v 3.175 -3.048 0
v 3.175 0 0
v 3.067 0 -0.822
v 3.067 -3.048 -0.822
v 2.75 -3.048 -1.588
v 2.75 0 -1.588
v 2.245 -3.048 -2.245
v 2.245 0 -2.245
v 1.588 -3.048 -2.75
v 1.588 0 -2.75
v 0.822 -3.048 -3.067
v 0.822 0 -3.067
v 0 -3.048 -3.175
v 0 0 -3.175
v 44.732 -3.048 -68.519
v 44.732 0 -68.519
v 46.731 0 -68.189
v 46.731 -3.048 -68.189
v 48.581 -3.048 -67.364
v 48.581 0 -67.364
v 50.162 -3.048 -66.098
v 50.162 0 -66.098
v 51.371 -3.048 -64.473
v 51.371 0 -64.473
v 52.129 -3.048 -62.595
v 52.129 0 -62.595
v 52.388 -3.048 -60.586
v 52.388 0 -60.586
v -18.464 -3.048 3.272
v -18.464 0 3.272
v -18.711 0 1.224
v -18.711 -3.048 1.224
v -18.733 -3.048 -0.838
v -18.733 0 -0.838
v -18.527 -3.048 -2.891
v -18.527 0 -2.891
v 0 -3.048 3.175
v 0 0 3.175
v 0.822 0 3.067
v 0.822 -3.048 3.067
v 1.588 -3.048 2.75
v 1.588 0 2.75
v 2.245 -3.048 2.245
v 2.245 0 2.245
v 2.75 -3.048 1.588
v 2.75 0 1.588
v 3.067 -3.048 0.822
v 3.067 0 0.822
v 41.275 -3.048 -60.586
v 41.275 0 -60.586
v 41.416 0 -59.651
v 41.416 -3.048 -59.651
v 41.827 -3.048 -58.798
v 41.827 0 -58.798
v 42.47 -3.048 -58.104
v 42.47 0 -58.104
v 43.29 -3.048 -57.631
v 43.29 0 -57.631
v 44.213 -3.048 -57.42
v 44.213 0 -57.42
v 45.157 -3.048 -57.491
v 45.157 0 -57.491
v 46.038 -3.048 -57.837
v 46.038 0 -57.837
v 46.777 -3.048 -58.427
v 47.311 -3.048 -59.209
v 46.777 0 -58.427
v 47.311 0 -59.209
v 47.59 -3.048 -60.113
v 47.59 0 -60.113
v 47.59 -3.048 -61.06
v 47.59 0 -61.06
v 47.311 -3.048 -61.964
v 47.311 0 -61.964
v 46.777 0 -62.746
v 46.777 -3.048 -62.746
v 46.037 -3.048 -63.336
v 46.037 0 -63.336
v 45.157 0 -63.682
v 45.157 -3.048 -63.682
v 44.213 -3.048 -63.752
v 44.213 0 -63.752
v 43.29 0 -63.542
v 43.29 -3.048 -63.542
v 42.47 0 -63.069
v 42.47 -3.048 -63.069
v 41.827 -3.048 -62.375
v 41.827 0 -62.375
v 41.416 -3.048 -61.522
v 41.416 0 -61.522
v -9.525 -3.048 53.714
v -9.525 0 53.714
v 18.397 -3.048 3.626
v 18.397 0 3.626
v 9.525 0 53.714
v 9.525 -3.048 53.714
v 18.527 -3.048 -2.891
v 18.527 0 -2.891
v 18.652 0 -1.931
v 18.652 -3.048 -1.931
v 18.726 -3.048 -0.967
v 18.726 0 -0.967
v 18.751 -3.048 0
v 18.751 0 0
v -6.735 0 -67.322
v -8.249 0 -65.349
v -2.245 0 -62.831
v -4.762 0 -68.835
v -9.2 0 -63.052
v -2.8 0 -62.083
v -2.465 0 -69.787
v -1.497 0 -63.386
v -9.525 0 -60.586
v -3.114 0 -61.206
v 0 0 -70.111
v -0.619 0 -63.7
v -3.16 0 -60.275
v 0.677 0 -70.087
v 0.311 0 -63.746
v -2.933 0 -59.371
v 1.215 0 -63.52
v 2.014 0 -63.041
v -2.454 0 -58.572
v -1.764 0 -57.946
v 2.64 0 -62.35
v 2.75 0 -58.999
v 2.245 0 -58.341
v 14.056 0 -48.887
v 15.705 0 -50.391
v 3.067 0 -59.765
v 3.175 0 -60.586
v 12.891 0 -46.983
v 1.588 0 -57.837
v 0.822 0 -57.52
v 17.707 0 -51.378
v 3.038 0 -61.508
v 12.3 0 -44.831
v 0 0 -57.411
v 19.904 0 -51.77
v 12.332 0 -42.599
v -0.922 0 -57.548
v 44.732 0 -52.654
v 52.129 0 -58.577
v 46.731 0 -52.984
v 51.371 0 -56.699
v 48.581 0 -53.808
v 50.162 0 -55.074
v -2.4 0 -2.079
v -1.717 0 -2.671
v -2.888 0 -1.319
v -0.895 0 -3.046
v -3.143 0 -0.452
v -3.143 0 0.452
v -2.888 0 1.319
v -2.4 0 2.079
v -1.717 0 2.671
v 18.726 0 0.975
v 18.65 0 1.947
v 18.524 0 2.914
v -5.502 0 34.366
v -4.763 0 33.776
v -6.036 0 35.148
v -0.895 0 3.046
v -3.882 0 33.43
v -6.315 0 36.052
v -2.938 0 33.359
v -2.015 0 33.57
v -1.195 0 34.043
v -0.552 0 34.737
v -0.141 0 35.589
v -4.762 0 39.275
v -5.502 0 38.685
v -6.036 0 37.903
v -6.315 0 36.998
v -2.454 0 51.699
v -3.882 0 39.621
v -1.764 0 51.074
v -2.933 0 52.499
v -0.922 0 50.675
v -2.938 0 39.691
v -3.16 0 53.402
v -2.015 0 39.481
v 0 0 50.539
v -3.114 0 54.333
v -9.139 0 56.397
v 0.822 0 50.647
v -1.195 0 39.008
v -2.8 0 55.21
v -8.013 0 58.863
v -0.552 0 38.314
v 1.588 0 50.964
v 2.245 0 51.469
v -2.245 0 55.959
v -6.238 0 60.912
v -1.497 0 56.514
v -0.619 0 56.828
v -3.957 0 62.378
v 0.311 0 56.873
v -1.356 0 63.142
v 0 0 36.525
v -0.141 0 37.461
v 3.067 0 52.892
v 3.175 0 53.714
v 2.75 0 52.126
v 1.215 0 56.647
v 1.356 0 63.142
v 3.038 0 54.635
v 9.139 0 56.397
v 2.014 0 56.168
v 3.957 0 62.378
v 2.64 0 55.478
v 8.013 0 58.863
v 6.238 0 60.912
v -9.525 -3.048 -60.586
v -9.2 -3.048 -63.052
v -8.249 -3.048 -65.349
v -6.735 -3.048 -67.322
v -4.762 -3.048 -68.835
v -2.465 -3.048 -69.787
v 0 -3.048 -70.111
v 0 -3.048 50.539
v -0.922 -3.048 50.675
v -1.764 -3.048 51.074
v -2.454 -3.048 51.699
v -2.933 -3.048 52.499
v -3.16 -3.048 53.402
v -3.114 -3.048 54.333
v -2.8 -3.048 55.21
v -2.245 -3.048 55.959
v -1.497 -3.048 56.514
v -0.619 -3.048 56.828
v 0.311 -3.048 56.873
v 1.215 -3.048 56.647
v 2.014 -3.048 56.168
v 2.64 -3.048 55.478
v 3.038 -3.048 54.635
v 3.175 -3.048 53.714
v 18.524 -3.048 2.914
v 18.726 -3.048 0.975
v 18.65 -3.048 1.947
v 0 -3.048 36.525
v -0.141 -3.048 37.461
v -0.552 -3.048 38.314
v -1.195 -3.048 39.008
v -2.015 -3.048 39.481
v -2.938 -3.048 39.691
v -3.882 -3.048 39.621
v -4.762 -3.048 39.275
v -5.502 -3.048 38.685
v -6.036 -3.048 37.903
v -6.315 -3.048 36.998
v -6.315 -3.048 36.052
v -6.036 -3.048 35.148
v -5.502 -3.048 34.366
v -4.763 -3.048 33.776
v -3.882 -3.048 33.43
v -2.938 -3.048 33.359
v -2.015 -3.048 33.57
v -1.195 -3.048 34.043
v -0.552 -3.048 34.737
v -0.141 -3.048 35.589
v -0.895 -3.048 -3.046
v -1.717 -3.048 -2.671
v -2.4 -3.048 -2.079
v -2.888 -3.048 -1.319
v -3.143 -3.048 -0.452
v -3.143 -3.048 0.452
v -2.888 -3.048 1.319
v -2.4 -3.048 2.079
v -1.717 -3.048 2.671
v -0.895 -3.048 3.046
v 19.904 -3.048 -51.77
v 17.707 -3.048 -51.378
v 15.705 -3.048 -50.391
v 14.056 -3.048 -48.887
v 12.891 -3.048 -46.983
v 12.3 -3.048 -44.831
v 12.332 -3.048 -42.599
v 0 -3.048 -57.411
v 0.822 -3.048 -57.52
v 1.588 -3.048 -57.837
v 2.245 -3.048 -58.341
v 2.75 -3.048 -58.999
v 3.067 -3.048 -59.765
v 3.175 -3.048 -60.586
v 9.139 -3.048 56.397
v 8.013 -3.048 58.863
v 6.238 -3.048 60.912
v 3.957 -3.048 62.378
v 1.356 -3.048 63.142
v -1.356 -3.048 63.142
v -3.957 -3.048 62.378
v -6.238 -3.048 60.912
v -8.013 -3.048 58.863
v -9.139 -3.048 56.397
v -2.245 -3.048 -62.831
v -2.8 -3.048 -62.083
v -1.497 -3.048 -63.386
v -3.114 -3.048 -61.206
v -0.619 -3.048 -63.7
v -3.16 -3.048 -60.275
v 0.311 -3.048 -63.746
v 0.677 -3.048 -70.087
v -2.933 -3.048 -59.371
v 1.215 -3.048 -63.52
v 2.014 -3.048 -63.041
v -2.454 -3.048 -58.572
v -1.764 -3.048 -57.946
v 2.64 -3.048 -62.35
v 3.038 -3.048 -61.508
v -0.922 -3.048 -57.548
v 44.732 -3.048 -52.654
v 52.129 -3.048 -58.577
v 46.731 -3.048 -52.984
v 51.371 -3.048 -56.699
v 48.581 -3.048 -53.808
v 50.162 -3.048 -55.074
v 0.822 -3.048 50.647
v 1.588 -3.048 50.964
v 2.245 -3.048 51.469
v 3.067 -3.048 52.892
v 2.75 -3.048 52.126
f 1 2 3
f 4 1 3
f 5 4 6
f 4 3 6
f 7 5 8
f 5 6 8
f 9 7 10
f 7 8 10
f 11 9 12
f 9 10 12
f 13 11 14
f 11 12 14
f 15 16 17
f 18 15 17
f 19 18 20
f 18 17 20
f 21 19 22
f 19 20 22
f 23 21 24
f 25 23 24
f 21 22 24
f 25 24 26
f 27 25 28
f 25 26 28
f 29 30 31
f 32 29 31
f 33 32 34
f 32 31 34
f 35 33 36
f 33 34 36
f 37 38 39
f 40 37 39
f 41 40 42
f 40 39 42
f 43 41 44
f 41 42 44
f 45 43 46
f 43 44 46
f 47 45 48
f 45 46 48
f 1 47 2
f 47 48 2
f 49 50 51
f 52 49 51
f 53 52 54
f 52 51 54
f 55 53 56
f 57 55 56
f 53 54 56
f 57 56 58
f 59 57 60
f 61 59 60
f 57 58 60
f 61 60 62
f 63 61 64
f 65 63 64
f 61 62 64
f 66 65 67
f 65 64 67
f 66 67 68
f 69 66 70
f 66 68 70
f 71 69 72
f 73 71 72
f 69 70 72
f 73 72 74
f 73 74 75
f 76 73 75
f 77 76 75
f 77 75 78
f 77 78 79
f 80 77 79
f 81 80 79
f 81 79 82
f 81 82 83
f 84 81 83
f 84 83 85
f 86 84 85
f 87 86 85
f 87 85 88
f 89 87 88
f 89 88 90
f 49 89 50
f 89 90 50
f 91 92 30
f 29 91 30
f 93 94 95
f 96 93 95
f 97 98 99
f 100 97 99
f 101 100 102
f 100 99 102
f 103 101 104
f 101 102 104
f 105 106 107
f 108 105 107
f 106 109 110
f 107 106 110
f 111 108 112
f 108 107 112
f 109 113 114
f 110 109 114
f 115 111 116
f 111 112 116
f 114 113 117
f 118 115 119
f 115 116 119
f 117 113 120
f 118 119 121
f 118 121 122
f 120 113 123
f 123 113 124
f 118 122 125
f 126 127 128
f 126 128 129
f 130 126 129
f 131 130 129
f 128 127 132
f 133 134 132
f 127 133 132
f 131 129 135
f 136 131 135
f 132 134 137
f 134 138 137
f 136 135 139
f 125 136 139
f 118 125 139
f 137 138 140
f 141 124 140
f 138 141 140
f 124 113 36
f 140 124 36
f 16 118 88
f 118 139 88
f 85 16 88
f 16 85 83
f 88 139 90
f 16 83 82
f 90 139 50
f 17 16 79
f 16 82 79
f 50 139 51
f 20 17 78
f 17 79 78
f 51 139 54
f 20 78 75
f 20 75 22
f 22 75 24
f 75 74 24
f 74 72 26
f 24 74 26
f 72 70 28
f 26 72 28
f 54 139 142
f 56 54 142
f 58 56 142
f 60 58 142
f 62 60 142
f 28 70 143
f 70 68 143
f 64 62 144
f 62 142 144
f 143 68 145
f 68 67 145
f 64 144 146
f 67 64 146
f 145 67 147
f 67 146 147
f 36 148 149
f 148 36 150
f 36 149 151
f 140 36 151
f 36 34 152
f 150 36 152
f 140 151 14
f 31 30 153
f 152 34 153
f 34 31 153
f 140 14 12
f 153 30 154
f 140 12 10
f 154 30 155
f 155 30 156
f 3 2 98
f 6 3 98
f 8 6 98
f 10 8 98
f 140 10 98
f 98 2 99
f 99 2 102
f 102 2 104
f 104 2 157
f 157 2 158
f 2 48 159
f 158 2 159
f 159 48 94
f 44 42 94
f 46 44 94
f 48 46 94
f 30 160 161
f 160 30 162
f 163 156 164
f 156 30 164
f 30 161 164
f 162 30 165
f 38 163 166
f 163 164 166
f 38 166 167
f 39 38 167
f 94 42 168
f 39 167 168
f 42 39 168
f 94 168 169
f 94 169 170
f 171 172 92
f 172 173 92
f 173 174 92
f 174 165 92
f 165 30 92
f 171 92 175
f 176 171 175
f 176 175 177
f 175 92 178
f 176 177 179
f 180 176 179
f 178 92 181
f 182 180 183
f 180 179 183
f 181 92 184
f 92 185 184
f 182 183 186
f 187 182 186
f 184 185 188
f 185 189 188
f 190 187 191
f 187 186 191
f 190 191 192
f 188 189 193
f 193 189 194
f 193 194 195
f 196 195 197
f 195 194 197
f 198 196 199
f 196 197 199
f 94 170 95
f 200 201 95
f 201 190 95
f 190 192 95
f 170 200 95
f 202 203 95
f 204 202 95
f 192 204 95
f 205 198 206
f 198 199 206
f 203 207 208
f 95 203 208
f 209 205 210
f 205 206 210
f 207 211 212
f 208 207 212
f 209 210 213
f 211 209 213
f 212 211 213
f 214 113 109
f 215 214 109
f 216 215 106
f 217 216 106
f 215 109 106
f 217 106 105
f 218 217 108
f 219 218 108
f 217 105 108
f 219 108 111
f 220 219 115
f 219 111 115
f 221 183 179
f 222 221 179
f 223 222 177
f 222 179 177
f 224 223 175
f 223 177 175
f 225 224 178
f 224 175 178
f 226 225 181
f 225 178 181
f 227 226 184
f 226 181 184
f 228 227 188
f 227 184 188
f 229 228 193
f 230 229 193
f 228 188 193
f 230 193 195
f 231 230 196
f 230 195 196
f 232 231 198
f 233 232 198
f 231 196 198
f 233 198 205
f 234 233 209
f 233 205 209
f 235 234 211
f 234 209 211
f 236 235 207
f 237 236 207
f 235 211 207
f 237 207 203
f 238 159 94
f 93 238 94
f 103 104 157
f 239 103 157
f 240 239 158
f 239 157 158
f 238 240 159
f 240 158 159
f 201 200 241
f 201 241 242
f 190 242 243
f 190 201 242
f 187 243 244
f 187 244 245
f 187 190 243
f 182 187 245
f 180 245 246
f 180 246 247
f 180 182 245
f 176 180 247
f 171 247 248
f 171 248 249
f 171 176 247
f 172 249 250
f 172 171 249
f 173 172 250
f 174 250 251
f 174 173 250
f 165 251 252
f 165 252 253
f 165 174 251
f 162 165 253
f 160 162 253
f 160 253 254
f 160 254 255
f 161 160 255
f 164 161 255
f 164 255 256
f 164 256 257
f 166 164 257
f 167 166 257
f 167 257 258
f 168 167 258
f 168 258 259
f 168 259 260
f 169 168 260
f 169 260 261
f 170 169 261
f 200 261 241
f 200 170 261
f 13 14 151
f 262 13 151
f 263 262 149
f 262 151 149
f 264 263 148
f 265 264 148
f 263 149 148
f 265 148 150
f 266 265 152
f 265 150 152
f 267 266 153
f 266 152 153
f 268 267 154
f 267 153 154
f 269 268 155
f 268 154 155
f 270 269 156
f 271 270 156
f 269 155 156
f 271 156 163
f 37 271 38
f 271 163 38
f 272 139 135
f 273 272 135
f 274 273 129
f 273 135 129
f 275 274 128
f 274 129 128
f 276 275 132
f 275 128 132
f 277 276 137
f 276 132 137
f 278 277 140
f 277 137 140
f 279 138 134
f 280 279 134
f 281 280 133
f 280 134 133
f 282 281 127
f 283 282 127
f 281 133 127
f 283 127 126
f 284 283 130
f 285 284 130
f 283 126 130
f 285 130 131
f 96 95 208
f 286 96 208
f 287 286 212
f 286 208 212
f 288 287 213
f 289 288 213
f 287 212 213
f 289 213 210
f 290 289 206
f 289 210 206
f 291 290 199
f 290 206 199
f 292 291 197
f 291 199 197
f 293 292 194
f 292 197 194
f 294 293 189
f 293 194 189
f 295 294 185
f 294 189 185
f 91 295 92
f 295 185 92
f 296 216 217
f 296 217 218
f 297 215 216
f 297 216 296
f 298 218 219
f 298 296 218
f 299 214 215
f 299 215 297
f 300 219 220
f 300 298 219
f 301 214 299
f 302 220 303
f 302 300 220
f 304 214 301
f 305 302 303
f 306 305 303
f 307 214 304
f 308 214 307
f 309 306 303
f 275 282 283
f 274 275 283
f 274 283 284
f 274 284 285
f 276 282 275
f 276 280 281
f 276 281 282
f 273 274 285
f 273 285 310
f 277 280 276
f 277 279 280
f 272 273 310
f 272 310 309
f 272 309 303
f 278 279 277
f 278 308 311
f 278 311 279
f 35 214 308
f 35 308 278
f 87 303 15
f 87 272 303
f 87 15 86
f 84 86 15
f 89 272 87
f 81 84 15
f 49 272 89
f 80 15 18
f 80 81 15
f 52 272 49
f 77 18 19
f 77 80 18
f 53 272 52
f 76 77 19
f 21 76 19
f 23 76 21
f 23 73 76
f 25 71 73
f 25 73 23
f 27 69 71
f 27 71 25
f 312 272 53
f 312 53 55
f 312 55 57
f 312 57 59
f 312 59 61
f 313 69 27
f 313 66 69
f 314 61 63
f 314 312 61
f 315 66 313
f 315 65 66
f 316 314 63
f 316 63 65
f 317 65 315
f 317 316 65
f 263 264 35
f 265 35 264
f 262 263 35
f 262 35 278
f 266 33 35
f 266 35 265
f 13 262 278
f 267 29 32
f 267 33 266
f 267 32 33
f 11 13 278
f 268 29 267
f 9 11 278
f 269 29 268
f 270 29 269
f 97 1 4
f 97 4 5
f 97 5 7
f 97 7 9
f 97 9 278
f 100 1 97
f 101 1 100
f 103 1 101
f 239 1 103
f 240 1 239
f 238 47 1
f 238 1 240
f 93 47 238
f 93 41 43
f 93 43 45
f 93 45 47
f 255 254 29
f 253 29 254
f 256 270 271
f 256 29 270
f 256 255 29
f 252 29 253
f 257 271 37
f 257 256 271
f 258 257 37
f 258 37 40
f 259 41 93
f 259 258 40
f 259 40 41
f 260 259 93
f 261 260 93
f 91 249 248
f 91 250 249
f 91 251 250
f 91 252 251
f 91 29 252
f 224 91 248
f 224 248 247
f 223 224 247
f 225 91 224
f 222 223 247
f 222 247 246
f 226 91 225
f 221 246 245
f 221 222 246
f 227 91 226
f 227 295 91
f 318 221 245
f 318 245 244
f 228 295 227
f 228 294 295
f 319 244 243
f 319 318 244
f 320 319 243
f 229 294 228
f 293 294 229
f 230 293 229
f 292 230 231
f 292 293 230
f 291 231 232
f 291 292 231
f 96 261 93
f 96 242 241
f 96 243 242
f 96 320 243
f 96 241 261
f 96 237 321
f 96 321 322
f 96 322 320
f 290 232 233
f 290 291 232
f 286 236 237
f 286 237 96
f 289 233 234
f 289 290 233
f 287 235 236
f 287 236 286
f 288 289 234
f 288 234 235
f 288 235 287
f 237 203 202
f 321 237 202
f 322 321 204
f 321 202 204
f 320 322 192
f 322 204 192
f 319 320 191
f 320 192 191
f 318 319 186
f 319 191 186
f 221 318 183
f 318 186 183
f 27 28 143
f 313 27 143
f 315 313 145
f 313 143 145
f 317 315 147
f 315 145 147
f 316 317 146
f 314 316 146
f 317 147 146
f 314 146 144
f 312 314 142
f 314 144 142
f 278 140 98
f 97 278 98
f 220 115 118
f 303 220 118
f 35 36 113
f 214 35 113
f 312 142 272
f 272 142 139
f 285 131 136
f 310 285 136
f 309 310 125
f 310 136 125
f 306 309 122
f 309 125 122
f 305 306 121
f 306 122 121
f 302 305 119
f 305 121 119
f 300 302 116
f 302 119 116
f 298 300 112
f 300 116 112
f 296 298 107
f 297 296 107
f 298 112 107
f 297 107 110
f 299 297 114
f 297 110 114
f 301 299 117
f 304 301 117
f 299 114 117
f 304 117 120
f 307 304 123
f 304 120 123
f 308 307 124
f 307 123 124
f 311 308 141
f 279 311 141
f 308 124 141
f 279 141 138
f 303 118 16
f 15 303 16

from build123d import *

# Parameters (mm, degrees)
F0_R     = 3.175
F1_DEPTH = 3.048


with BuildPart() as f1:
    # F0 (on Front) → F1 (new body)
    with BuildSketch(Plane.XZ):
        with BuildLine():
            ThreePointArc((18.5272162363, -2.8907946242), (12.1944256202, -14.2446628188), (0, -18.7513848829))
            Line((0, -18.7513848829), (0, -51.0613519013))
            ThreePointArc((0, -51.0613519013), (6.7351920908, -53.8511598105), (9.525, -60.5863519013))
            Line((9.525, -60.5863519013), (36.5125, -60.5863519013))
            ThreePointArc((36.5125, -60.5863519013), (38.9380895153, -54.8747191174), (44.7324052746, -52.6538772867))
            Line((44.7324052746, -52.6538772867), (19.9038367454, -51.7699515192))
            ThreePointArc((19.9038367454, -51.7699515192), (14.056218392, -48.8866966862), (12.3315367458, -42.5991477155))
            Line((12.3315367458, -42.5991477155), (18.5272162363, -2.8907946242))
        make_face()
        with BuildLine():
            Line((36.5125, -60.5863519013), (9.525, -60.5863519013))
            ThreePointArc((9.525, -60.5863519013), (6.9705567315, -67.0776509895), (0.6773435479, -70.0872376873))
            Line((0.6773435479, -70.0872376873), (44.7324052746, -68.5188265159))
            ThreePointArc((44.7324052746, -68.5188265159), (38.9380895153, -66.2979846852), (36.5125, -60.5863519013))
        make_face()
        with BuildLine():
            Line((0, 18.7513848829), (0, 3.175))
            ThreePointArc((0, 3.175), (2.2450640303, 2.2450640303), (3.175, 0))
            ThreePointArc((3.175, 0), (2.2450640303, -2.2450640303), (0, -3.175))
            Line((0, -3.175), (0, -18.7513848829))
            ThreePointArc((0, -18.7513848829), (12.1944256202, -14.2446628188), (18.5272162363, -2.8907946242))
            ThreePointArc((18.5272162363, -2.8907946242), (18.6952587236, -1.4497366262), (18.7513848829, 0))
            ThreePointArc((18.7513848829, 0), (18.6943609499, 1.4612678406), (18.5236359763, 2.9136480987))
            Line((18.5236359763, 2.9136480987), (18.3973654955, 3.6264828487))
            ThreePointArc((18.3973654955, 3.6264828487), (11.9082504878, 14.4847507865), (0, 18.7513848829))
        make_face()
        with BuildLine():
            ThreePointArc((0, -3.175), (-3.175, 0), (0, 3.175))
            Line((0, 3.175), (0, 18.7513848829))
            ThreePointArc((0, 18.7513848829), (-12.0470149388, 14.3695464817), (-18.4637179825, 3.2719341818))
            ThreePointArc((-18.4637179825, 3.2719341818), (-18.7503896007, 0.1931963966), (-18.5272162363, -2.8907946242))
            ThreePointArc((-18.5272162363, -2.8907946242), (-12.1944256202, -14.2446628188), (0, -18.7513848829))
            Line((0, -18.7513848829), (0, -3.175))
        make_face()
        with BuildLine():
            Line((0, -57.4113519013), (0, -51.0613519013))
            ThreePointArc((0, -51.0613519013), (-6.7351920908, -53.8511598105), (-9.525, -60.5863519013))
            ThreePointArc((-9.525, -60.5863519013), (-6.7351920908, -67.3215439921), (0, -70.1113519013))
            Line((0, -70.1113519013), (0.6773435479, -70.0872376873))
            ThreePointArc((0.6773435479, -70.0872376873), (6.9705567315, -67.0776509895), (9.525, -60.5863519013))
            Line((9.525, -60.5863519013), (3.175, -60.5863519013))
            ThreePointArc((3.175, -60.5863519013), (-2.2450640303, -62.8314159316), (0, -57.4113519013))
        make_face()
        with BuildLine():
            ThreePointArc((9.525, -60.5863519013), (6.7351920908, -53.8511598105), (0, -51.0613519013))
            Line((0, -51.0613519013), (0, -57.4113519013))
            ThreePointArc((0, -57.4113519013), (2.2450640303, -58.341287871), (3.175, -60.5863519013))
            Line((3.175, -60.5863519013), (9.525, -60.5863519013))
        make_face()
        with BuildLine():
            ThreePointArc((-18.4637179825, 3.2719341818), (-12.0470149388, 14.3695464817), (0, 18.7513848829))
            Line((0, 18.7513848829), (0, 36.5252))
            Line((0, 36.5252), (0, 44.1886480987))
            ThreePointArc((0, 44.1886480987), (-6.7351920908, 46.9784560079), (-9.525, 53.7136480987))
            Line((-9.525, 53.7136480987), (-18.4637179825, 3.2719341818))
        make_face()
        with Locations((-3.175, 36.5252)):
            Circle(F0_R, mode=Mode.SUBTRACT)
        with BuildLine():
            Line((0, 36.5252), (0, 18.7513848829))
            ThreePointArc((0, 18.7513848829), (11.9082504878, 14.4847507865), (18.3973654955, 3.6264828487))
            Line((18.3973654955, 3.6264828487), (9.525, 53.7136480987))
            ThreePointArc((9.525, 53.7136480987), (6.7351920908, 46.9784560079), (0, 44.1886480987))
            Line((0, 44.1886480987), (0, 36.5252))
        make_face()
        with BuildLine():
            Line((0, -51.0613519013), (0, -18.7513848829))
            ThreePointArc((0, -18.7513848829), (-12.1944256202, -14.2446628188), (-18.5272162363, -2.8907946242))
            Line((-18.5272162363, -2.8907946242), (-9.525, -60.5863519013))
            ThreePointArc((-9.525, -60.5863519013), (-6.7351920908, -53.8511598105), (0, -51.0613519013))
        make_face()
        with BuildLine():
            ThreePointArc((44.7324052746, -52.6538772867), (38.9380895153, -54.8747191174), (36.5125, -60.5863519013))
            ThreePointArc((36.5125, -60.5863519013), (38.9380895153, -66.2979846852), (44.7324052746, -68.5188265159))
            ThreePointArc((44.7324052746, -68.5188265159), (50.1616327839, -66.098262386), (52.3875, -60.5863519013))
            ThreePointArc((52.3875, -60.5863519013), (50.1616327839, -55.0744414166), (44.7324052746, -52.6538772867))
        make_face()
        with BuildLine():
            ThreePointArc((47.625, -60.5863519013), (44.45, -63.7613519013), (41.275, -60.5863519013))
            ThreePointArc((41.275, -60.5863519013), (44.45, -57.4113519013), (47.625, -60.5863519013))
        make_face(mode=Mode.SUBTRACT)
        with BuildLine():
            ThreePointArc((-9.525, 53.7136480987), (-6.7351920908, 46.9784560079), (0, 44.1886480987))
            ThreePointArc((0, 44.1886480987), (6.7351920908, 46.9784560079), (9.525, 53.7136480987))
            ThreePointArc((9.525, 53.7136480987), (0, 63.2386480987), (-9.525, 53.7136480987))
        make_face()
        with BuildLine():
            ThreePointArc((3.175, 53.7136480987), (2.2450640303, 51.4685840684), (0, 50.5386480987))
            ThreePointArc((0, 50.5386480987), (-2.2450640303, 55.958712129), (3.175, 53.7136480987))
        make_face(mode=Mode.SUBTRACT)
    extrude(amount=F1_DEPTH)


solid = f1.part
